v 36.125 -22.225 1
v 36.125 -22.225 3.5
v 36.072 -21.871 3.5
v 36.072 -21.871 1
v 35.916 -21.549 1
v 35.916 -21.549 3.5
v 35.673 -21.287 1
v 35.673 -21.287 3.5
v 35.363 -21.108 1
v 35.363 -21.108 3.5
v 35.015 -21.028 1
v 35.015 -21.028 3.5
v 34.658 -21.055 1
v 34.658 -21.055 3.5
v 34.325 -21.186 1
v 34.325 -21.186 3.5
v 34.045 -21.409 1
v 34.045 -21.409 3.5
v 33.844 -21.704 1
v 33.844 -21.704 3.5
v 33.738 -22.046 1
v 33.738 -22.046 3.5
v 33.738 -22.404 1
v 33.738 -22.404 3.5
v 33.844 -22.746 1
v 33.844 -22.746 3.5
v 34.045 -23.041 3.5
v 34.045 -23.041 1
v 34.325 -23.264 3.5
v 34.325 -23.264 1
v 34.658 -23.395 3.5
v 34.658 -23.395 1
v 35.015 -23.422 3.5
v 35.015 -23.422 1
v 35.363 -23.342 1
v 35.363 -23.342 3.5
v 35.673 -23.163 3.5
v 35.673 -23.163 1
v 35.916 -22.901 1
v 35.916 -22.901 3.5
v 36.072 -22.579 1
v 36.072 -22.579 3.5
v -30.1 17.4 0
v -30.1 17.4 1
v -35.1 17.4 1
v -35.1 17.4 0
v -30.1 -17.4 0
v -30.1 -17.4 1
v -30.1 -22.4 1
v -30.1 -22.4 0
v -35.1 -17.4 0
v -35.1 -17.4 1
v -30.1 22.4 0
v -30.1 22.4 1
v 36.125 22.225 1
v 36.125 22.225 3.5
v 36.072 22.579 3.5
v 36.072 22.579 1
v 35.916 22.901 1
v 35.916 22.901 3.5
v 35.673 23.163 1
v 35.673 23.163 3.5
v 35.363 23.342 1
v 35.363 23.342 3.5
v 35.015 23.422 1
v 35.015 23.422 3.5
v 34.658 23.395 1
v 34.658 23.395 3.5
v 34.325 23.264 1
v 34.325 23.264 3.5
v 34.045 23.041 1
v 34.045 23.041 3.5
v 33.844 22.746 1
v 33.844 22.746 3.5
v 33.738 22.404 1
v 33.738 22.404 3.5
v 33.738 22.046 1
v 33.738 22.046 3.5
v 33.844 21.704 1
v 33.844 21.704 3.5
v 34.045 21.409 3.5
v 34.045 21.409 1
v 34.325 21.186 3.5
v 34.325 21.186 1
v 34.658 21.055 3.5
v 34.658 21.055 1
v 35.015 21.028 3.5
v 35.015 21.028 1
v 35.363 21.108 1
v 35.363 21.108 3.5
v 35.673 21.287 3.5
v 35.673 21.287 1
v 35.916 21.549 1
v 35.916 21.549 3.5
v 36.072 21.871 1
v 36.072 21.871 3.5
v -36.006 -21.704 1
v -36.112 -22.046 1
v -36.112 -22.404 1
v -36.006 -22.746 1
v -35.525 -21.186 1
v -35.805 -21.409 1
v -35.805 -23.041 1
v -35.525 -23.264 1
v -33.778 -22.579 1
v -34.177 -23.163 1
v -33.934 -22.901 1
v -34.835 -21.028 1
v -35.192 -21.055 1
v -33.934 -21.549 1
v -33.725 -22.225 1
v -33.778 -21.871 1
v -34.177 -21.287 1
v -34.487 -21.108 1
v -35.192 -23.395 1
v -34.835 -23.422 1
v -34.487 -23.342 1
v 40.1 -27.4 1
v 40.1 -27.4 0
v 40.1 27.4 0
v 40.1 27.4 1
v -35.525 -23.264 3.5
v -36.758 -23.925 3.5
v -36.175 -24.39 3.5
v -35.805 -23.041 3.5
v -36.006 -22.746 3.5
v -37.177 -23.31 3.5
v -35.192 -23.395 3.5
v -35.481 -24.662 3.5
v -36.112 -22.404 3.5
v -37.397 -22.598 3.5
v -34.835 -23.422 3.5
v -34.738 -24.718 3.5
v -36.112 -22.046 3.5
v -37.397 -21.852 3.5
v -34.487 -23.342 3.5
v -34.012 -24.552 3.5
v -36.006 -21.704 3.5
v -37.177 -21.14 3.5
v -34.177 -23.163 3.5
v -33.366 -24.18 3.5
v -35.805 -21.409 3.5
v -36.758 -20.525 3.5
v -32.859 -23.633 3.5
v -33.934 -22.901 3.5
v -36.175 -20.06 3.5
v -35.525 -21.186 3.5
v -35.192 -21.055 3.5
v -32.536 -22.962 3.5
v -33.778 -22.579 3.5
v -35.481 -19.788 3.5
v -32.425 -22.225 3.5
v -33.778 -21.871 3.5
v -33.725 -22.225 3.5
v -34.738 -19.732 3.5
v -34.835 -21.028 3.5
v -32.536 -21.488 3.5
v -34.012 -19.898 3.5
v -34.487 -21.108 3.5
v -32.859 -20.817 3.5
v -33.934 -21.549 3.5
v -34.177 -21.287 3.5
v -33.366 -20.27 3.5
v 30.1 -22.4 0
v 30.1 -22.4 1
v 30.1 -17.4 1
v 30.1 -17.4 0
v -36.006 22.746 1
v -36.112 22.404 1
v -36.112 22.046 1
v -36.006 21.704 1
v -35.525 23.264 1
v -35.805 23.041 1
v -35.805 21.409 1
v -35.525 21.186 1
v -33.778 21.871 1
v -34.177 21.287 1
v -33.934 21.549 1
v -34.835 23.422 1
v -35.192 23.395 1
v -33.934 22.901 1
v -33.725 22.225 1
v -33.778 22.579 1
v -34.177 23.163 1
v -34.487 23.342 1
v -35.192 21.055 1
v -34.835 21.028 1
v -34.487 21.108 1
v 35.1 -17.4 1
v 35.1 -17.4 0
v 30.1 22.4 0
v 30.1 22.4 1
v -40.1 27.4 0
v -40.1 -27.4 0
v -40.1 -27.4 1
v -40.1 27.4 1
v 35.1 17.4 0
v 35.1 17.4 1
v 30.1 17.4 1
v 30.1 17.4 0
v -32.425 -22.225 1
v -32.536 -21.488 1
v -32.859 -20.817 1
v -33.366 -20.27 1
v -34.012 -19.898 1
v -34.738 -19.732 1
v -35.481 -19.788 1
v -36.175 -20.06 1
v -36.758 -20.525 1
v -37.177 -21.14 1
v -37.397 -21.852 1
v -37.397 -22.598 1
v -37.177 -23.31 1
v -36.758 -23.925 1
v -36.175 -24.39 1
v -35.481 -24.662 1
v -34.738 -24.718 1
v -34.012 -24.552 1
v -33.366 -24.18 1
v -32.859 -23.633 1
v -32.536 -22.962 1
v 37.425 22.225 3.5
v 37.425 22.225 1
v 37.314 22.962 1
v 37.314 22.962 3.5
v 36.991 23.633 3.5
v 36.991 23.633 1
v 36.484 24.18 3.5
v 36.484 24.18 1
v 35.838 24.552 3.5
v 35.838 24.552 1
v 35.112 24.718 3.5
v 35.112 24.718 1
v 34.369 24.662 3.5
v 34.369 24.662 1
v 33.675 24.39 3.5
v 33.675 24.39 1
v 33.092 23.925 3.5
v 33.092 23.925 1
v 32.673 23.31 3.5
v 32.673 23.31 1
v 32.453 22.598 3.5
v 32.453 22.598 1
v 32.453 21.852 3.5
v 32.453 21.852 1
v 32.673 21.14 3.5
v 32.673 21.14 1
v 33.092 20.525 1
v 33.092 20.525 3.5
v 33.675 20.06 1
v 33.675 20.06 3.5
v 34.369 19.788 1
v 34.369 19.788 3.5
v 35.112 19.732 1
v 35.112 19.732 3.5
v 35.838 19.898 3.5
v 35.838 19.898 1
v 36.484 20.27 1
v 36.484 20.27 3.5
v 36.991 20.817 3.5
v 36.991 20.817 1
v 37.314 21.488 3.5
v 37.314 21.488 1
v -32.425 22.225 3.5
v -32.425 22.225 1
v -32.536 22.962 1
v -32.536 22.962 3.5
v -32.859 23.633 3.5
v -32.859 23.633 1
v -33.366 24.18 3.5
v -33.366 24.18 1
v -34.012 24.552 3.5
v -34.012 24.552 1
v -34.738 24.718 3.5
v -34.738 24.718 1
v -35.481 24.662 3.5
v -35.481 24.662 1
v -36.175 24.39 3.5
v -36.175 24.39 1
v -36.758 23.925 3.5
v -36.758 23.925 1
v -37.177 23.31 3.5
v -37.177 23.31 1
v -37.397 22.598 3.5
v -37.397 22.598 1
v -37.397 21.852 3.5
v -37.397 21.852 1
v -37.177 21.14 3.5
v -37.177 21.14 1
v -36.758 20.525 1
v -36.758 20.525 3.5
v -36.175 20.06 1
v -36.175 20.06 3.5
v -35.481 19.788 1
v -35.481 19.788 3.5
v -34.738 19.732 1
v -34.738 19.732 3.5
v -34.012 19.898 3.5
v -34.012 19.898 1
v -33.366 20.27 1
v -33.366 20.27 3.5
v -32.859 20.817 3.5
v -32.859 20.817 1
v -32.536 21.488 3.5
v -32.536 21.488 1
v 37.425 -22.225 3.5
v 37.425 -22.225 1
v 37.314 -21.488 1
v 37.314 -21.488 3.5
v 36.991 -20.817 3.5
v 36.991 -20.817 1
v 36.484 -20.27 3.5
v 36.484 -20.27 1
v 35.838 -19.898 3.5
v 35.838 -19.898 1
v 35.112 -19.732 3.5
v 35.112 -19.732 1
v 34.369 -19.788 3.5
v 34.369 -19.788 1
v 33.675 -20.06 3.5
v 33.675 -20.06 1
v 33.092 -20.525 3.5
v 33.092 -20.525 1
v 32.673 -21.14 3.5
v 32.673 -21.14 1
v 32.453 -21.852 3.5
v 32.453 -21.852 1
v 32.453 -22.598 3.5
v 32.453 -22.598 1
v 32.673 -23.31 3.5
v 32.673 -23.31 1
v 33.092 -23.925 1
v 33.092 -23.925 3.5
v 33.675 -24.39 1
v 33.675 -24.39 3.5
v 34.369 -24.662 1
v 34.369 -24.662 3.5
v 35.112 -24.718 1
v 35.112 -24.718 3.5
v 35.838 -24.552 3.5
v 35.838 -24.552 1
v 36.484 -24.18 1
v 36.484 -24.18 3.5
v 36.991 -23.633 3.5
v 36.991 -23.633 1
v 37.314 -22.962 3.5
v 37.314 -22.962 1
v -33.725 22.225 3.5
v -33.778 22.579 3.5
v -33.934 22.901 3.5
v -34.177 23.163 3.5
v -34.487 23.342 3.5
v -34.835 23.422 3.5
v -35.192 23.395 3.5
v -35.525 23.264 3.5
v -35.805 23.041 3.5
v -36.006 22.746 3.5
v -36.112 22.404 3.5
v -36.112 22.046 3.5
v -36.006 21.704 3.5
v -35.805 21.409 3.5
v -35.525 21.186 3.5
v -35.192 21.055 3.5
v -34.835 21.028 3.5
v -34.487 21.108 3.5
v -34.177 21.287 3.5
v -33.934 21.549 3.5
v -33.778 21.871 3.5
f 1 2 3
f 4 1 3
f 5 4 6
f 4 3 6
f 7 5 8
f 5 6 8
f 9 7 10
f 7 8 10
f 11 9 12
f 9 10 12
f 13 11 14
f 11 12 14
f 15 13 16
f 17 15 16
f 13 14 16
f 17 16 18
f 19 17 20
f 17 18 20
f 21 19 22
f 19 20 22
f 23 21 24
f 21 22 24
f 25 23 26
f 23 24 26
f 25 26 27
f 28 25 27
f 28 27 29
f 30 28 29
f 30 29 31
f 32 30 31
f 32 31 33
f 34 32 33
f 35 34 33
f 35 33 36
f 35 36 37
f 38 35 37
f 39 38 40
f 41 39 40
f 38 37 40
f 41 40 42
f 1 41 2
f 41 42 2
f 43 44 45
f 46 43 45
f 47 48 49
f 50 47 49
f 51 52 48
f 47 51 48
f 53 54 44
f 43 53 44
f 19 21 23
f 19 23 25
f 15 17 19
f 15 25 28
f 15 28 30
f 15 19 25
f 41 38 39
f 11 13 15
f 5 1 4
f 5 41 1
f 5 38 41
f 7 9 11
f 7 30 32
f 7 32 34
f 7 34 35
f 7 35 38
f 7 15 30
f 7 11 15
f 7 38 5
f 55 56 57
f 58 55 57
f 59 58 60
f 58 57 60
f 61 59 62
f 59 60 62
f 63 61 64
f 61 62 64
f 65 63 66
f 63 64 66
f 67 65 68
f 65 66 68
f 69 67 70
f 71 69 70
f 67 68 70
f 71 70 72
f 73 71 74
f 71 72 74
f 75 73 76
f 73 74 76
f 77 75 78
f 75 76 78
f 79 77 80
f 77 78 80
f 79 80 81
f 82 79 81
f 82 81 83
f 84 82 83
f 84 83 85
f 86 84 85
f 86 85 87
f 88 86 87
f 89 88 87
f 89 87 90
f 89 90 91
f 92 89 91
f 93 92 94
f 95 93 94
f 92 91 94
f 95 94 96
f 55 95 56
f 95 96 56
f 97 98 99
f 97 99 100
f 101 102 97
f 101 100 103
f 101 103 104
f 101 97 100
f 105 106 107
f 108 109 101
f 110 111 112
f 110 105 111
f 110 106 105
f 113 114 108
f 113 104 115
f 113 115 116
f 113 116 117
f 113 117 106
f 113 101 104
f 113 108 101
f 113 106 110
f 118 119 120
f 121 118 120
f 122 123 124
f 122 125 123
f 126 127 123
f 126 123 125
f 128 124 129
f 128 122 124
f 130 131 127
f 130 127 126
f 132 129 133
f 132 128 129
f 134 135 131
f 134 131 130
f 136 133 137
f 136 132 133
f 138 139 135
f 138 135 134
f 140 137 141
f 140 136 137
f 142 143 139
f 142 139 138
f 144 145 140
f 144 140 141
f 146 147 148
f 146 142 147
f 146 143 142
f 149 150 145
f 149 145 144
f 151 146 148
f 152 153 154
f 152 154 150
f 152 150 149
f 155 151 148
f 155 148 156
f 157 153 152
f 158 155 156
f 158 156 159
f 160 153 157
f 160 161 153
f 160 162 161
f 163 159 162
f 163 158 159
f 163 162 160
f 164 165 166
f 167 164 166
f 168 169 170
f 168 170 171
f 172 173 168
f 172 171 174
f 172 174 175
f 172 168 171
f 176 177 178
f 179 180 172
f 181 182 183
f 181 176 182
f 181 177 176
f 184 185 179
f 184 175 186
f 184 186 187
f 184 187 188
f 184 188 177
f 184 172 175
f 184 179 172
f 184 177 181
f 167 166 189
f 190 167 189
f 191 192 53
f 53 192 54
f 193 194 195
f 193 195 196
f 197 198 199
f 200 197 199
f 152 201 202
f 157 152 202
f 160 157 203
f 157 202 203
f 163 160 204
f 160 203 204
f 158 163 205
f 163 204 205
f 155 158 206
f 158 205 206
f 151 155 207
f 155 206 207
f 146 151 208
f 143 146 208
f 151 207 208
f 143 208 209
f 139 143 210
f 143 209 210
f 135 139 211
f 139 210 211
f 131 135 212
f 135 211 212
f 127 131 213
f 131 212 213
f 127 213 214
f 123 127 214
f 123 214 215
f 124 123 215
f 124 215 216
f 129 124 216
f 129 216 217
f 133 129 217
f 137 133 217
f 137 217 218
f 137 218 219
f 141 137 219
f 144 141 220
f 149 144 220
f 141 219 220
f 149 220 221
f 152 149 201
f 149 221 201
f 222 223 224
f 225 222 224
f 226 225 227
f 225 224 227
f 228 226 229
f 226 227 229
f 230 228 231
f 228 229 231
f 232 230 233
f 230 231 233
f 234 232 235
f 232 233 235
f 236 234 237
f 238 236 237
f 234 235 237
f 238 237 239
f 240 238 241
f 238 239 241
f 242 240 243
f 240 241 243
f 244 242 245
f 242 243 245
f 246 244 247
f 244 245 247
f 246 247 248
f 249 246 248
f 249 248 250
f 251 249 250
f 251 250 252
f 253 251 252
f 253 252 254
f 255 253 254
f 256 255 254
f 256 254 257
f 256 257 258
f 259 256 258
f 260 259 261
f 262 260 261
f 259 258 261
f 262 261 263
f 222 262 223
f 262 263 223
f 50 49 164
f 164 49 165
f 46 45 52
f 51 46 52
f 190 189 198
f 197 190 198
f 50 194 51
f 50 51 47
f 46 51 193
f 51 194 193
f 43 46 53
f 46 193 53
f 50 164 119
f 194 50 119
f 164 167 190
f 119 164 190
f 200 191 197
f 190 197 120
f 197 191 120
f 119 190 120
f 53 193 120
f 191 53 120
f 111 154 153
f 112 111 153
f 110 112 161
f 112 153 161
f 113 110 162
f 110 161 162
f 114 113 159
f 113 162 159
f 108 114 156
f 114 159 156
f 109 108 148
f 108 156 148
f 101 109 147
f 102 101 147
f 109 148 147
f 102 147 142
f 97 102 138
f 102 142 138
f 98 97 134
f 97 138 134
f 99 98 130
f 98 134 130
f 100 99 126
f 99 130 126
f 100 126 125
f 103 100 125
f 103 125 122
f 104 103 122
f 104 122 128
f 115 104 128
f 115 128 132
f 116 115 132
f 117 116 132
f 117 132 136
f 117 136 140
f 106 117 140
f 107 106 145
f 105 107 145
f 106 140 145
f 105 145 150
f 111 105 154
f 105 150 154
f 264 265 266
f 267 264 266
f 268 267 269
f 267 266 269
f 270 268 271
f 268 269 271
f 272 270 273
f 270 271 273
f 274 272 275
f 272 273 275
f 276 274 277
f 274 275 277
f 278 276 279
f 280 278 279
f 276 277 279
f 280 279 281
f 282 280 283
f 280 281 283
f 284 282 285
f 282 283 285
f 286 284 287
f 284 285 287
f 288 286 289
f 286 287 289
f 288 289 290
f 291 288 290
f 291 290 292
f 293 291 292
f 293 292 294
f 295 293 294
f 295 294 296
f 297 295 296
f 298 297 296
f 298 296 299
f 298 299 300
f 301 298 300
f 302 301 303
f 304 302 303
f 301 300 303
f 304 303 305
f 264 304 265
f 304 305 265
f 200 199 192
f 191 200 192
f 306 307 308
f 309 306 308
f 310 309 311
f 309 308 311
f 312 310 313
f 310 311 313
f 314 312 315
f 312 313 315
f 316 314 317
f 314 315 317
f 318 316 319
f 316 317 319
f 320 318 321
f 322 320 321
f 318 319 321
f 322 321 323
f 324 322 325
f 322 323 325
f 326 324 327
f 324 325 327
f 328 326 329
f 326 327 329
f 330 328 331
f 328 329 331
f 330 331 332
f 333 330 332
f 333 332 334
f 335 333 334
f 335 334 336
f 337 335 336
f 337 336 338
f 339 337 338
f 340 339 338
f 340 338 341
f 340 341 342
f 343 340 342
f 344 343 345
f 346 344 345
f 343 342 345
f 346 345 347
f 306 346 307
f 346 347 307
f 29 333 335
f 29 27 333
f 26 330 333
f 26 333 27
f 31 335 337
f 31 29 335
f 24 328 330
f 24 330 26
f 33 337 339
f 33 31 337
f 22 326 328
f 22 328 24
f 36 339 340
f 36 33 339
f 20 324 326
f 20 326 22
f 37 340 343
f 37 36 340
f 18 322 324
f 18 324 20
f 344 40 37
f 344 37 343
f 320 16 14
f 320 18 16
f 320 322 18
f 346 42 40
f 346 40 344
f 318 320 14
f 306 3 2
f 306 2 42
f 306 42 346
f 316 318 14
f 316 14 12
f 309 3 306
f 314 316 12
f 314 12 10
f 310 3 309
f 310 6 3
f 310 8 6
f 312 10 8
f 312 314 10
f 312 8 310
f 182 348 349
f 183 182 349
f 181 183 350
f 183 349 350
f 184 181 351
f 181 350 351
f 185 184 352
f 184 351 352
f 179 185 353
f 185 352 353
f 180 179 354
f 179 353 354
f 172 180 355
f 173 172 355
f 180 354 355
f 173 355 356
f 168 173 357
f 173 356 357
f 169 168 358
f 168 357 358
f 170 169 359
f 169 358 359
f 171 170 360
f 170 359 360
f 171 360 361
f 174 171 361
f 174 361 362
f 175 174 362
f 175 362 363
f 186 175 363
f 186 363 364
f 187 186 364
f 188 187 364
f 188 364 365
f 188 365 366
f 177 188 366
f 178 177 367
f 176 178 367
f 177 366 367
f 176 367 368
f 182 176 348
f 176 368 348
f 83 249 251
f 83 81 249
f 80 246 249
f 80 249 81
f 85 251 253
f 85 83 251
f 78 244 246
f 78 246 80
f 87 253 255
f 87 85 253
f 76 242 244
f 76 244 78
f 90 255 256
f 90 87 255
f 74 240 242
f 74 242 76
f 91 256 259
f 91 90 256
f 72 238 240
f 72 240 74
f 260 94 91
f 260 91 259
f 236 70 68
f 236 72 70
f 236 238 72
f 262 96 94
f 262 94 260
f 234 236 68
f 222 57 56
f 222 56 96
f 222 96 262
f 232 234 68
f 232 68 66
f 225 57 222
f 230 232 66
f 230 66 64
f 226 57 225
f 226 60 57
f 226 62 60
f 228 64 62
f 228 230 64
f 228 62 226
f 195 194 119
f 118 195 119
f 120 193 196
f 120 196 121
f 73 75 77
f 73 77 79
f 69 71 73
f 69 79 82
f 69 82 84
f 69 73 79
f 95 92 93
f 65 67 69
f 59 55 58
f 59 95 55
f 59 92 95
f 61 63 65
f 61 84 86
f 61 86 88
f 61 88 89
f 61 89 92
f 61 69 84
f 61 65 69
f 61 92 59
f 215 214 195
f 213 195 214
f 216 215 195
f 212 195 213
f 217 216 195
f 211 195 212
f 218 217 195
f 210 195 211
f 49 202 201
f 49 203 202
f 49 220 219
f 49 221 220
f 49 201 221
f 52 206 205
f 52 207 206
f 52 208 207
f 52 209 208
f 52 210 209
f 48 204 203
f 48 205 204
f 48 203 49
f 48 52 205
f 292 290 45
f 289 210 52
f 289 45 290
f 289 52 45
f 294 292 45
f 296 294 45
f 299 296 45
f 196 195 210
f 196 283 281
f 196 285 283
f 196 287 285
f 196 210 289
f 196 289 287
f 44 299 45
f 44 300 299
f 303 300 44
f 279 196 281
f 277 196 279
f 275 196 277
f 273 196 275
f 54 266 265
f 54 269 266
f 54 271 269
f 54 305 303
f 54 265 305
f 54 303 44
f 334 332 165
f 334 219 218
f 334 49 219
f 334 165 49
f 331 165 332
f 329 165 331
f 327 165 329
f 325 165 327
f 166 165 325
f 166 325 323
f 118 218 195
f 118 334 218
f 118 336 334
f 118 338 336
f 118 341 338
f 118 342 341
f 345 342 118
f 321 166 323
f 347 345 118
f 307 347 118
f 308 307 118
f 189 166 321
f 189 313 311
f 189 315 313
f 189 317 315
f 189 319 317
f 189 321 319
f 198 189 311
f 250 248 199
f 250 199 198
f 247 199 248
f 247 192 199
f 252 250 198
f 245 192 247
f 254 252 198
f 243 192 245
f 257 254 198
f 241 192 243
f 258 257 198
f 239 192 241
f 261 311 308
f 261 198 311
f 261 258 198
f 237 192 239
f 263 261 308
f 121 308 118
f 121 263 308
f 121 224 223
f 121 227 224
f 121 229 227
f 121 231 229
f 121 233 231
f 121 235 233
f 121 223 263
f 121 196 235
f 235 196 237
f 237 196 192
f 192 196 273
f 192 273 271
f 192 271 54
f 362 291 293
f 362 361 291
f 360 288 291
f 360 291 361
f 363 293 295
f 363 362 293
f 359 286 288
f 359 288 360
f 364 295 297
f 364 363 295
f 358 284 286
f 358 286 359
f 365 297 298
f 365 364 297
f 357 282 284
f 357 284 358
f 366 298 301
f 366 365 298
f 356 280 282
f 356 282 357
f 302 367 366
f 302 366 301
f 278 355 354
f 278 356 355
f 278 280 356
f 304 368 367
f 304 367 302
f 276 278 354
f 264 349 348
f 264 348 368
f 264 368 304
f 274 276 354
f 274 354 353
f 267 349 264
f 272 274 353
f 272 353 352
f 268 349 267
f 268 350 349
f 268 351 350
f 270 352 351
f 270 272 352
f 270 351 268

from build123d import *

# Parameters (mm, degrees)
SKETCH_W        = 80.2
SKETCH_H        = 54.8
PAD_DEPTH       = 1
POCKET_DEPTH    = 1.001
SKETCH002_R     = 2.5
PAD001_DEPTH    = 2.5
SKETCH003_R     = 1.2
POCKET001_DEPTH = 2.5


with BuildPart() as part:
    # Sketch → Pad (new body)
    with BuildSketch(Plane.XY):
        Rectangle(SKETCH_W, SKETCH_H)
    extrude(amount=PAD_DEPTH)

    # Sketch001 → Pocket (cut, through all)
    with BuildSketch(Plane.XY.offset(1)):
        Polygon((-35.1, 17.4), (-35.1, -17.4), (-30.1, -17.4), (-30.1, -22.4), (30.1, -22.4), (30.1, -17.4), (35.1, -17.4), (35.1, 17.4), (30.1, 17.4), (30.1, 22.4), (-30.1, 22.4), (-30.1, 17.4), align=None)
    extrude(amount=-POCKET_DEPTH, mode=Mode.SUBTRACT)

    # Sketch002 → Pad001 (new body)
    with BuildSketch(Plane.XY.offset(1)):
        with Locations((-34.925, 22.225)):
            Circle(SKETCH002_R)
        with Locations((-34.925, -22.225)):
            Circle(SKETCH002_R)
        with Locations((34.925, 22.225)):
            Circle(SKETCH002_R)
        with Locations((34.925, -22.225)):
            Circle(SKETCH002_R)
    extrude(amount=PAD001_DEPTH)

    # Sketch003 → Pocket001 (cut)
    with BuildSketch(Plane.XY.offset(3.5)):
        with Locations((-34.925, -22.225)):
            Circle(SKETCH003_R)
        with Locations((34.925, -22.225)):
            Circle(SKETCH003_R)
        with Locations((-34.925, 22.225)):
            Circle(SKETCH003_R)
        with Locations((34.925, 22.225)):
            Circle(SKETCH003_R)
    extrude(amount=-POCKET001_DEPTH, mode=Mode.SUBTRACT)


solid = part.part
